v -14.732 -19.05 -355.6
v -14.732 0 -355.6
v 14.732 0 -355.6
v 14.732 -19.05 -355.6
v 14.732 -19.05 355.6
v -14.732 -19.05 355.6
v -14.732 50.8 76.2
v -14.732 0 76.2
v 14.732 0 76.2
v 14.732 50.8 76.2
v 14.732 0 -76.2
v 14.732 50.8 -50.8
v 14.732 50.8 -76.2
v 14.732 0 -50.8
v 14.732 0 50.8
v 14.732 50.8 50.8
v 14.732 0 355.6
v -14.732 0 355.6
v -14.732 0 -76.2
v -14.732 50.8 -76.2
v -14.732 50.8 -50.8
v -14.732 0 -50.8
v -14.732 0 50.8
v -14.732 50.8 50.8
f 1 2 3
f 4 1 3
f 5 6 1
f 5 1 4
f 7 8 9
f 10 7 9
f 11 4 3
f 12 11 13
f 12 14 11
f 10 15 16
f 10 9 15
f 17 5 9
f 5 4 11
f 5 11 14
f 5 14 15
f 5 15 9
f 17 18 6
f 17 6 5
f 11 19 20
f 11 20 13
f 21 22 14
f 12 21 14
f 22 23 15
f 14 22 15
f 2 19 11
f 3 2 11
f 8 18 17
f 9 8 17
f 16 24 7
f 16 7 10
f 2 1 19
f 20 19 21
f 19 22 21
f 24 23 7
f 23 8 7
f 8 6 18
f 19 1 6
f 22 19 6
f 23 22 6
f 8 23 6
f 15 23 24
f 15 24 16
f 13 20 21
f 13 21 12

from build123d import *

# Parameters (mm, degrees)
SKETCH1_W           = 29.464
SKETCH1_H           = 19.05
BOSS_EXTRUDE1_DEPTH = 355.6
SKETCH2_W           = 29.464
SKETCH2_H           = 25.4
BOSS_EXTRUDE2_DEPTH = 50.8


with BuildPart() as part:
    # Sketch1 → Boss-Extrude1 (new, symmetric)
    with BuildSketch(Plane.XY):
        with Locations((0, -9.525)):
            Rectangle(SKETCH1_W, SKETCH1_H)
    extrude(amount=BOSS_EXTRUDE1_DEPTH, both=True)

    # Sketch2 → Boss-Extrude2 (add)
    with BuildSketch(Plane(origin=(0, 0, 0), x_dir=(1, 0, 0), z_dir=(0, 1, 0))):
        with Locations((0, 63.5)):
            Rectangle(SKETCH2_W, SKETCH2_H)
        with Locations((0, -63.5)):
            Rectangle(SKETCH2_W, SKETCH2_H)
    extrude(amount=BOSS_EXTRUDE2_DEPTH)


solid = part.part
